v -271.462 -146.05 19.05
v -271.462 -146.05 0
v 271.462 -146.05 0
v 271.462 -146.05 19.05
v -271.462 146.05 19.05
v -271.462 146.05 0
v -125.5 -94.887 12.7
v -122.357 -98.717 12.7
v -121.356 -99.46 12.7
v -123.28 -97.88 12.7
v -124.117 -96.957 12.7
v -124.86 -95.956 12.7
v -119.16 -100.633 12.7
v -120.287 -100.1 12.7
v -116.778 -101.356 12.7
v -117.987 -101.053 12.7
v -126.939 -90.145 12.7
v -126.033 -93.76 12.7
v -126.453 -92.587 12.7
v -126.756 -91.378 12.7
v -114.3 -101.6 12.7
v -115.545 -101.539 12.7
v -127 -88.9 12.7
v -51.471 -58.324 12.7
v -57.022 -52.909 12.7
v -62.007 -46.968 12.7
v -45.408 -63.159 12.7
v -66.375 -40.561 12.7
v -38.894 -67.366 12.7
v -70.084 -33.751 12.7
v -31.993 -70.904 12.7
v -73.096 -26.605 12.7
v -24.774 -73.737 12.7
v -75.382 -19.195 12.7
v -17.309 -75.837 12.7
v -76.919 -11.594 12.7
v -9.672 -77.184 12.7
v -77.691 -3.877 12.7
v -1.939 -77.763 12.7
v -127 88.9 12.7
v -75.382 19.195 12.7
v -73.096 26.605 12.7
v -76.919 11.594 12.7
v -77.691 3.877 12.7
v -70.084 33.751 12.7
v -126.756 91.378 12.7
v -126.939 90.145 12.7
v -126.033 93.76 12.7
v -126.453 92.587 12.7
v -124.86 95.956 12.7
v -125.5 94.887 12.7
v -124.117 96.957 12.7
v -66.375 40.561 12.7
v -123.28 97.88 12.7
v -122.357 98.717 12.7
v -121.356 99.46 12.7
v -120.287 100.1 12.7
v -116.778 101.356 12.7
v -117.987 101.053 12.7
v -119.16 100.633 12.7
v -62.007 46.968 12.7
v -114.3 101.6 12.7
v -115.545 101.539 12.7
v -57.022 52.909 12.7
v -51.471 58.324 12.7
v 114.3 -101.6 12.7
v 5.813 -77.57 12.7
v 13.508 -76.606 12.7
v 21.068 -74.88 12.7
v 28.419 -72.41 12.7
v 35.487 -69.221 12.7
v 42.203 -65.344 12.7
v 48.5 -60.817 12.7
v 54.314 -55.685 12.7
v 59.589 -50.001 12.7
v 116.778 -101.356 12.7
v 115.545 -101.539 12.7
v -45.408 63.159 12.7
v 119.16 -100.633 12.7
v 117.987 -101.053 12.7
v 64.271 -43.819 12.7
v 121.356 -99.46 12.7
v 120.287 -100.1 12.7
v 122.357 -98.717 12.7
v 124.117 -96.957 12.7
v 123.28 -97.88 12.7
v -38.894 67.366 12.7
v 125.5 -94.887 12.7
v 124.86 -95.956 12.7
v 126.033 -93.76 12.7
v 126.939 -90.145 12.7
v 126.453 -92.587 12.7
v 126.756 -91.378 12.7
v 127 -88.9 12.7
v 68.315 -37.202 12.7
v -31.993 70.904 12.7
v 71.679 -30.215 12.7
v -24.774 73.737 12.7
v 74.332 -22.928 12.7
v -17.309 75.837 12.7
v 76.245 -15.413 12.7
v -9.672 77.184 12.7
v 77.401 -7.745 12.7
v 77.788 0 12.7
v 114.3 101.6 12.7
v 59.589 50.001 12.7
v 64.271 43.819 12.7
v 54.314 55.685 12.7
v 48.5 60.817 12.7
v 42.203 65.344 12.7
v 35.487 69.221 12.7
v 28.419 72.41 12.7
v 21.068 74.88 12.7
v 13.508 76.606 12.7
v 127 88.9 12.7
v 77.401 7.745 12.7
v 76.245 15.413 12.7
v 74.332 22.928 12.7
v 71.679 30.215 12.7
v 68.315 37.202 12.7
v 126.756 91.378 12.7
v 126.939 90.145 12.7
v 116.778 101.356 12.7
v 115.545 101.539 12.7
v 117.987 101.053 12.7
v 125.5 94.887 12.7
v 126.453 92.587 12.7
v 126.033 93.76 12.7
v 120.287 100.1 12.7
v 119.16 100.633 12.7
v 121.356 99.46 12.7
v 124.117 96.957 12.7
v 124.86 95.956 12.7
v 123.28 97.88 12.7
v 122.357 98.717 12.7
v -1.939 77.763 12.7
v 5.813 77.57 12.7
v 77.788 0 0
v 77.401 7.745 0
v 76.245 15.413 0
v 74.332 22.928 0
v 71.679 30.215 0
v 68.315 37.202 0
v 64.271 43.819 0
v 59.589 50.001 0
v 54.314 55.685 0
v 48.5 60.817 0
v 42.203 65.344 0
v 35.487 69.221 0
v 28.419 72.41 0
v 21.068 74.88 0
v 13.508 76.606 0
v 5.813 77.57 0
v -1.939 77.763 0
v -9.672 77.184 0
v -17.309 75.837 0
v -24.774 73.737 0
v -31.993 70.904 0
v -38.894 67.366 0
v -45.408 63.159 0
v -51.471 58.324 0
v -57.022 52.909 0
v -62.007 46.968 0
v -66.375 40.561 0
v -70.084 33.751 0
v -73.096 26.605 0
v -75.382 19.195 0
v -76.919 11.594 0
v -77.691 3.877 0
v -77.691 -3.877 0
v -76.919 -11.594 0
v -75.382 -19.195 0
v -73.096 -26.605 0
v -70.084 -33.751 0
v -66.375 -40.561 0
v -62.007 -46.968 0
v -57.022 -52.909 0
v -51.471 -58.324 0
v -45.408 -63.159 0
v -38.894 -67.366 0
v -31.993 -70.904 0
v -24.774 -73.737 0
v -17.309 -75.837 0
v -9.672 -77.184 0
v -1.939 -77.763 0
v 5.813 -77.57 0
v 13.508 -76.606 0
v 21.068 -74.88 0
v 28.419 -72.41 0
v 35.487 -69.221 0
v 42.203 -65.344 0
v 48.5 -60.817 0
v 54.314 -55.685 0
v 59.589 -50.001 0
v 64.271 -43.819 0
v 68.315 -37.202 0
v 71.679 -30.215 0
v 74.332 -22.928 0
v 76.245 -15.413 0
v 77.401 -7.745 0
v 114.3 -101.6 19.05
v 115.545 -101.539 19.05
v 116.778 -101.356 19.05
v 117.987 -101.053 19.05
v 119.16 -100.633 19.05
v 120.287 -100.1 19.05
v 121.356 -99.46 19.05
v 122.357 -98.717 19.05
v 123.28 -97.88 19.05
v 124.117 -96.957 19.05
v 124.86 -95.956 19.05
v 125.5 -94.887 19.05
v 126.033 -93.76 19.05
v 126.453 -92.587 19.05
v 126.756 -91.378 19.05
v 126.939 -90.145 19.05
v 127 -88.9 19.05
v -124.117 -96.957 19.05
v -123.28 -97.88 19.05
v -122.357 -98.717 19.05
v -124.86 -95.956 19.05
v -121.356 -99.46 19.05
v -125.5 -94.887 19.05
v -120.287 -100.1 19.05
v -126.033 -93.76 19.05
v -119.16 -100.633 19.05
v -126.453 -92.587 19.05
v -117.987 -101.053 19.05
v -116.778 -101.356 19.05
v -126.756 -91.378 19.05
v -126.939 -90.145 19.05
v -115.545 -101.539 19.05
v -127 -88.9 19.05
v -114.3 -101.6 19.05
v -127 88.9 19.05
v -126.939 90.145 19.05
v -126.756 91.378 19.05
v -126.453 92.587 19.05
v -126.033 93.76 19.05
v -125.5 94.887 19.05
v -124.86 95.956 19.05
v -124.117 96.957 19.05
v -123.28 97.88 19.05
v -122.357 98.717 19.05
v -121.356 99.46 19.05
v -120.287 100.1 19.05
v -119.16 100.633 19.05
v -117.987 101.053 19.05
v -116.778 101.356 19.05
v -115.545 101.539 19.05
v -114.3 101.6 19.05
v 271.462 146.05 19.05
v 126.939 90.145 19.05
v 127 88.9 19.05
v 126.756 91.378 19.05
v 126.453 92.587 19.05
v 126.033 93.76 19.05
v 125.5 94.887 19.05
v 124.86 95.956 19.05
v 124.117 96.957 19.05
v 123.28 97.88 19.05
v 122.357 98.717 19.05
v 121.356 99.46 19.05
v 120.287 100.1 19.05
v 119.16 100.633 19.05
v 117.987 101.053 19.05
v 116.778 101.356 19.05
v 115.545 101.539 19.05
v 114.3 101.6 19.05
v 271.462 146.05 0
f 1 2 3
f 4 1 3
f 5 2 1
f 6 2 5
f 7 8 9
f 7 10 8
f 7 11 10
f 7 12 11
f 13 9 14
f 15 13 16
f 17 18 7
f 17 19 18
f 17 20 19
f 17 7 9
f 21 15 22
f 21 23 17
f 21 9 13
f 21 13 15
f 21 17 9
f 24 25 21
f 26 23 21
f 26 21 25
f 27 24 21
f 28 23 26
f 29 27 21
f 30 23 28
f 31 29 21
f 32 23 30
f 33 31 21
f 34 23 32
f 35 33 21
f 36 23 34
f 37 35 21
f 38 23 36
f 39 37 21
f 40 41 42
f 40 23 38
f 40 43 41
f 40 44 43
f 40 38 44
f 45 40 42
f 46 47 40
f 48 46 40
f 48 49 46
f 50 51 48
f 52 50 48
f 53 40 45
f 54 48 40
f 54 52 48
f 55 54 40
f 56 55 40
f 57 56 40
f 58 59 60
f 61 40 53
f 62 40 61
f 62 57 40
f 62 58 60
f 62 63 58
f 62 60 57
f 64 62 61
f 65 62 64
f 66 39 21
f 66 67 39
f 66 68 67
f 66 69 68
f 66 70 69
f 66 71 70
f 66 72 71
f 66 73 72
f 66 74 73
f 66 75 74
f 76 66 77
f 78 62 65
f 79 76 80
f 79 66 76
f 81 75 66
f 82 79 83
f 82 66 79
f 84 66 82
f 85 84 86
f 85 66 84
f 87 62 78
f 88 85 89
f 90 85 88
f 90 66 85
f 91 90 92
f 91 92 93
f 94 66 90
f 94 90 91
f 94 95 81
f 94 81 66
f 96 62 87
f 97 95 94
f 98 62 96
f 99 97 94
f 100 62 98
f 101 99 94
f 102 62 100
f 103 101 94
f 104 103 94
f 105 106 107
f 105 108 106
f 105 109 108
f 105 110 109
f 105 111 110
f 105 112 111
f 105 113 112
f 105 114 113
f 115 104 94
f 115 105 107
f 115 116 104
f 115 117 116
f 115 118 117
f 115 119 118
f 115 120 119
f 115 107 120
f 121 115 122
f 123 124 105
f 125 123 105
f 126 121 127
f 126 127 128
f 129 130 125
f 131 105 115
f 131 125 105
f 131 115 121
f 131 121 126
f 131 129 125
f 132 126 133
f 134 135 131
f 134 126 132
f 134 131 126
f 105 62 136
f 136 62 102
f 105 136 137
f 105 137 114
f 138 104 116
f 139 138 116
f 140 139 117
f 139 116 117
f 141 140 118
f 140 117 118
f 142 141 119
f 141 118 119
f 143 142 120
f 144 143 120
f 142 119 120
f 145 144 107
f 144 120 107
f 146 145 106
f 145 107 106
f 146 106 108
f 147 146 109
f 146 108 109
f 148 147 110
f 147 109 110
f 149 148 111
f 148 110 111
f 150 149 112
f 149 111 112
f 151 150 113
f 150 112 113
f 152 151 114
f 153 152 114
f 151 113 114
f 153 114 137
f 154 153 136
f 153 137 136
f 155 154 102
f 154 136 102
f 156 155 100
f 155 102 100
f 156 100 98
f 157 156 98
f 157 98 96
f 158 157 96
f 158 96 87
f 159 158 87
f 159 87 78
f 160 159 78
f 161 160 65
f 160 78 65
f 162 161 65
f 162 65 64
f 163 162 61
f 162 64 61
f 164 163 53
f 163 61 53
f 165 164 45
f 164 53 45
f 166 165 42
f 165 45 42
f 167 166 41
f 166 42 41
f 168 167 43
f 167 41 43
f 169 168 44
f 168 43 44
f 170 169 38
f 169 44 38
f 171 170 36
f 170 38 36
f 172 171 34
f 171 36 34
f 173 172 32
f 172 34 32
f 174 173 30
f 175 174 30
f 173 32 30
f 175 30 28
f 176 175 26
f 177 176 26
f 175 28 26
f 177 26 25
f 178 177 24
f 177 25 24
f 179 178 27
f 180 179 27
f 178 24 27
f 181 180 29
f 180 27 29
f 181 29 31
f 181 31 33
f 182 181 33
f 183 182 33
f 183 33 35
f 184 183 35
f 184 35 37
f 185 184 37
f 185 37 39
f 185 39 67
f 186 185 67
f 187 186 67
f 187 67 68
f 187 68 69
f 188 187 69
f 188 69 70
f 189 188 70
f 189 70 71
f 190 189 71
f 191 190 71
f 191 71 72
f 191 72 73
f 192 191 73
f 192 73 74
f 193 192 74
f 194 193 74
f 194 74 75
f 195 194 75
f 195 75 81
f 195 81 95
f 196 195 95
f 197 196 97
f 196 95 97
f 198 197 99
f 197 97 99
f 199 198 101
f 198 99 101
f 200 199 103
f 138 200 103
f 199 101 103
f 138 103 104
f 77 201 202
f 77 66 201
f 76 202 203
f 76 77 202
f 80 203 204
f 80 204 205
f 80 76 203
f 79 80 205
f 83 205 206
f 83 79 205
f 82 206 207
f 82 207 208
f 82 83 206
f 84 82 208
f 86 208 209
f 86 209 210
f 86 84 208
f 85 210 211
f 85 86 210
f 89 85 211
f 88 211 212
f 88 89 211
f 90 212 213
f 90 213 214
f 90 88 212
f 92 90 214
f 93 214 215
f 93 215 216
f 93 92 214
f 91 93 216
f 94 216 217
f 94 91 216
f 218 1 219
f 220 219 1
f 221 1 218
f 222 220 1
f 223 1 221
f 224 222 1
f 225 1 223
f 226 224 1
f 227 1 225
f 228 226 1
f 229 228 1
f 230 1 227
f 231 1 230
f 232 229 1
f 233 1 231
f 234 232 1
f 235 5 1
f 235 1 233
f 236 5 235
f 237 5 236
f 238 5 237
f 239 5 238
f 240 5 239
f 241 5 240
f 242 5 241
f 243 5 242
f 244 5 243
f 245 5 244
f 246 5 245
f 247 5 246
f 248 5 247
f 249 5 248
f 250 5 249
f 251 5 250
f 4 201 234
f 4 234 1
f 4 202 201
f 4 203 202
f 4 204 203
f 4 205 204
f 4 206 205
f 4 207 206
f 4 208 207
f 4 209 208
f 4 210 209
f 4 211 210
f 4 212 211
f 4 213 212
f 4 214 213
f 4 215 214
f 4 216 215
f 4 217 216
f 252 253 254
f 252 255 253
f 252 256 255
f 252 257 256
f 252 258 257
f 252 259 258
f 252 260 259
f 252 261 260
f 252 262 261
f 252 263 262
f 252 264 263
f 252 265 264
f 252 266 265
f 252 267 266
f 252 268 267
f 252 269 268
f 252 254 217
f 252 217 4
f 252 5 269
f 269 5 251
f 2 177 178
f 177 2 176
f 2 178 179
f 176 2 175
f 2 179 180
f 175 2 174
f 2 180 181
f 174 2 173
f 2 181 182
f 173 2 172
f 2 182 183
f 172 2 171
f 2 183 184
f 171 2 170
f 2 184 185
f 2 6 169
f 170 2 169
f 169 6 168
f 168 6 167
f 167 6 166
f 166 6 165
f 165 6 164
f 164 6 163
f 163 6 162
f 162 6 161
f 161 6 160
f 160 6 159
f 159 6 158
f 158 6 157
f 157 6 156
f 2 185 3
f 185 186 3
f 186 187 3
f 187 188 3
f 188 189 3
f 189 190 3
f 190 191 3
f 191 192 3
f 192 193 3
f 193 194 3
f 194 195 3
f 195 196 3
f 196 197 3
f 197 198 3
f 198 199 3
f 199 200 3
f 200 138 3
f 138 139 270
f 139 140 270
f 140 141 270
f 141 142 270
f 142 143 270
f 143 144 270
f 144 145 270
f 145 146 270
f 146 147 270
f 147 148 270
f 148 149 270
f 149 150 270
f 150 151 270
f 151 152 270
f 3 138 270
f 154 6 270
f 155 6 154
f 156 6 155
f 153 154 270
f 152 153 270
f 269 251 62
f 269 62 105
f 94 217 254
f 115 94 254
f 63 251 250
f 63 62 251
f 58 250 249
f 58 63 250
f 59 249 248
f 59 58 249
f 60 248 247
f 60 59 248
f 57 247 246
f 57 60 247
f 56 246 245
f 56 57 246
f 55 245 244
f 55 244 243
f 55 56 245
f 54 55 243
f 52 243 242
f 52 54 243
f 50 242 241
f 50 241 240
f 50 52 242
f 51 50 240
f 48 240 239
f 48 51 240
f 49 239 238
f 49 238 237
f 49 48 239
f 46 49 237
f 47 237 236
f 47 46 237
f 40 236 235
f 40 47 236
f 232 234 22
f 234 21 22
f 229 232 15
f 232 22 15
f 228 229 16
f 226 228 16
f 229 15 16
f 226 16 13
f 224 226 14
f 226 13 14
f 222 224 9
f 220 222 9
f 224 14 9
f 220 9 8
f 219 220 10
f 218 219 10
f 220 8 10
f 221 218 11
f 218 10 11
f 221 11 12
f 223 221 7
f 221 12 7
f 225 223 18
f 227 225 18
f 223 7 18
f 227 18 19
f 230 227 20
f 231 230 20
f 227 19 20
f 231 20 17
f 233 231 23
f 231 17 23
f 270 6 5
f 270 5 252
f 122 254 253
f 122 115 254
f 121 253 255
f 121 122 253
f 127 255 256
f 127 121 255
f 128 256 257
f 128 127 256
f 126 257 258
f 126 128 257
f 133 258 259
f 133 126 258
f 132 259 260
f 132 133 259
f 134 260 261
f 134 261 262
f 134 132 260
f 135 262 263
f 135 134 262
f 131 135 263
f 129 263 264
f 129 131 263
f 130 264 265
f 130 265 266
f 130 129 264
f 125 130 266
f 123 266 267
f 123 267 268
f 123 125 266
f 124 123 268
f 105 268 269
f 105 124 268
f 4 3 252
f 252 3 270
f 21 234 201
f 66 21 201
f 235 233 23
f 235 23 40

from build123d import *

# Parameters (mm, degrees)
F0_W     = 542.925
F0_H     = 292.1
F1_DEPTH = 19.05
F2_W     = 254
F2_H     = 203.2
F3_DEPTH = 6.35
F4_R     = 12.7
F5_R     = 77.7875
F6_DEPTH = 12.7


with BuildPart() as f1:
    # F0 (on Top) → F1 (new body)
    with BuildSketch(Plane.XY):
        Rectangle(F0_W, F0_H)
    extrude(amount=F1_DEPTH)

    # F2 (on face) → F3 (cut)
    with BuildSketch(Plane.XY.offset(19.05)):
        Rectangle(F2_W, F2_H)
    extrude(amount=-F3_DEPTH, mode=Mode.SUBTRACT)

    # F4
    f4_edges = [f1.edges().sort_by_distance(p)[0] for p in [
        (127, -101.6, 15.875),
        (-127, -101.6, 15.875),
        (-127, 101.6, 15.875),
        (127, 101.6, 15.875),
    ]]
    fillet(f4_edges, radius=F4_R)

    # F5 (on face) → F6 (cut, through all)
    with BuildSketch(Plane.XY.offset(12.7)):
        Circle(F5_R)
    extrude(amount=-F6_DEPTH, mode=Mode.SUBTRACT)


solid = f1.part
